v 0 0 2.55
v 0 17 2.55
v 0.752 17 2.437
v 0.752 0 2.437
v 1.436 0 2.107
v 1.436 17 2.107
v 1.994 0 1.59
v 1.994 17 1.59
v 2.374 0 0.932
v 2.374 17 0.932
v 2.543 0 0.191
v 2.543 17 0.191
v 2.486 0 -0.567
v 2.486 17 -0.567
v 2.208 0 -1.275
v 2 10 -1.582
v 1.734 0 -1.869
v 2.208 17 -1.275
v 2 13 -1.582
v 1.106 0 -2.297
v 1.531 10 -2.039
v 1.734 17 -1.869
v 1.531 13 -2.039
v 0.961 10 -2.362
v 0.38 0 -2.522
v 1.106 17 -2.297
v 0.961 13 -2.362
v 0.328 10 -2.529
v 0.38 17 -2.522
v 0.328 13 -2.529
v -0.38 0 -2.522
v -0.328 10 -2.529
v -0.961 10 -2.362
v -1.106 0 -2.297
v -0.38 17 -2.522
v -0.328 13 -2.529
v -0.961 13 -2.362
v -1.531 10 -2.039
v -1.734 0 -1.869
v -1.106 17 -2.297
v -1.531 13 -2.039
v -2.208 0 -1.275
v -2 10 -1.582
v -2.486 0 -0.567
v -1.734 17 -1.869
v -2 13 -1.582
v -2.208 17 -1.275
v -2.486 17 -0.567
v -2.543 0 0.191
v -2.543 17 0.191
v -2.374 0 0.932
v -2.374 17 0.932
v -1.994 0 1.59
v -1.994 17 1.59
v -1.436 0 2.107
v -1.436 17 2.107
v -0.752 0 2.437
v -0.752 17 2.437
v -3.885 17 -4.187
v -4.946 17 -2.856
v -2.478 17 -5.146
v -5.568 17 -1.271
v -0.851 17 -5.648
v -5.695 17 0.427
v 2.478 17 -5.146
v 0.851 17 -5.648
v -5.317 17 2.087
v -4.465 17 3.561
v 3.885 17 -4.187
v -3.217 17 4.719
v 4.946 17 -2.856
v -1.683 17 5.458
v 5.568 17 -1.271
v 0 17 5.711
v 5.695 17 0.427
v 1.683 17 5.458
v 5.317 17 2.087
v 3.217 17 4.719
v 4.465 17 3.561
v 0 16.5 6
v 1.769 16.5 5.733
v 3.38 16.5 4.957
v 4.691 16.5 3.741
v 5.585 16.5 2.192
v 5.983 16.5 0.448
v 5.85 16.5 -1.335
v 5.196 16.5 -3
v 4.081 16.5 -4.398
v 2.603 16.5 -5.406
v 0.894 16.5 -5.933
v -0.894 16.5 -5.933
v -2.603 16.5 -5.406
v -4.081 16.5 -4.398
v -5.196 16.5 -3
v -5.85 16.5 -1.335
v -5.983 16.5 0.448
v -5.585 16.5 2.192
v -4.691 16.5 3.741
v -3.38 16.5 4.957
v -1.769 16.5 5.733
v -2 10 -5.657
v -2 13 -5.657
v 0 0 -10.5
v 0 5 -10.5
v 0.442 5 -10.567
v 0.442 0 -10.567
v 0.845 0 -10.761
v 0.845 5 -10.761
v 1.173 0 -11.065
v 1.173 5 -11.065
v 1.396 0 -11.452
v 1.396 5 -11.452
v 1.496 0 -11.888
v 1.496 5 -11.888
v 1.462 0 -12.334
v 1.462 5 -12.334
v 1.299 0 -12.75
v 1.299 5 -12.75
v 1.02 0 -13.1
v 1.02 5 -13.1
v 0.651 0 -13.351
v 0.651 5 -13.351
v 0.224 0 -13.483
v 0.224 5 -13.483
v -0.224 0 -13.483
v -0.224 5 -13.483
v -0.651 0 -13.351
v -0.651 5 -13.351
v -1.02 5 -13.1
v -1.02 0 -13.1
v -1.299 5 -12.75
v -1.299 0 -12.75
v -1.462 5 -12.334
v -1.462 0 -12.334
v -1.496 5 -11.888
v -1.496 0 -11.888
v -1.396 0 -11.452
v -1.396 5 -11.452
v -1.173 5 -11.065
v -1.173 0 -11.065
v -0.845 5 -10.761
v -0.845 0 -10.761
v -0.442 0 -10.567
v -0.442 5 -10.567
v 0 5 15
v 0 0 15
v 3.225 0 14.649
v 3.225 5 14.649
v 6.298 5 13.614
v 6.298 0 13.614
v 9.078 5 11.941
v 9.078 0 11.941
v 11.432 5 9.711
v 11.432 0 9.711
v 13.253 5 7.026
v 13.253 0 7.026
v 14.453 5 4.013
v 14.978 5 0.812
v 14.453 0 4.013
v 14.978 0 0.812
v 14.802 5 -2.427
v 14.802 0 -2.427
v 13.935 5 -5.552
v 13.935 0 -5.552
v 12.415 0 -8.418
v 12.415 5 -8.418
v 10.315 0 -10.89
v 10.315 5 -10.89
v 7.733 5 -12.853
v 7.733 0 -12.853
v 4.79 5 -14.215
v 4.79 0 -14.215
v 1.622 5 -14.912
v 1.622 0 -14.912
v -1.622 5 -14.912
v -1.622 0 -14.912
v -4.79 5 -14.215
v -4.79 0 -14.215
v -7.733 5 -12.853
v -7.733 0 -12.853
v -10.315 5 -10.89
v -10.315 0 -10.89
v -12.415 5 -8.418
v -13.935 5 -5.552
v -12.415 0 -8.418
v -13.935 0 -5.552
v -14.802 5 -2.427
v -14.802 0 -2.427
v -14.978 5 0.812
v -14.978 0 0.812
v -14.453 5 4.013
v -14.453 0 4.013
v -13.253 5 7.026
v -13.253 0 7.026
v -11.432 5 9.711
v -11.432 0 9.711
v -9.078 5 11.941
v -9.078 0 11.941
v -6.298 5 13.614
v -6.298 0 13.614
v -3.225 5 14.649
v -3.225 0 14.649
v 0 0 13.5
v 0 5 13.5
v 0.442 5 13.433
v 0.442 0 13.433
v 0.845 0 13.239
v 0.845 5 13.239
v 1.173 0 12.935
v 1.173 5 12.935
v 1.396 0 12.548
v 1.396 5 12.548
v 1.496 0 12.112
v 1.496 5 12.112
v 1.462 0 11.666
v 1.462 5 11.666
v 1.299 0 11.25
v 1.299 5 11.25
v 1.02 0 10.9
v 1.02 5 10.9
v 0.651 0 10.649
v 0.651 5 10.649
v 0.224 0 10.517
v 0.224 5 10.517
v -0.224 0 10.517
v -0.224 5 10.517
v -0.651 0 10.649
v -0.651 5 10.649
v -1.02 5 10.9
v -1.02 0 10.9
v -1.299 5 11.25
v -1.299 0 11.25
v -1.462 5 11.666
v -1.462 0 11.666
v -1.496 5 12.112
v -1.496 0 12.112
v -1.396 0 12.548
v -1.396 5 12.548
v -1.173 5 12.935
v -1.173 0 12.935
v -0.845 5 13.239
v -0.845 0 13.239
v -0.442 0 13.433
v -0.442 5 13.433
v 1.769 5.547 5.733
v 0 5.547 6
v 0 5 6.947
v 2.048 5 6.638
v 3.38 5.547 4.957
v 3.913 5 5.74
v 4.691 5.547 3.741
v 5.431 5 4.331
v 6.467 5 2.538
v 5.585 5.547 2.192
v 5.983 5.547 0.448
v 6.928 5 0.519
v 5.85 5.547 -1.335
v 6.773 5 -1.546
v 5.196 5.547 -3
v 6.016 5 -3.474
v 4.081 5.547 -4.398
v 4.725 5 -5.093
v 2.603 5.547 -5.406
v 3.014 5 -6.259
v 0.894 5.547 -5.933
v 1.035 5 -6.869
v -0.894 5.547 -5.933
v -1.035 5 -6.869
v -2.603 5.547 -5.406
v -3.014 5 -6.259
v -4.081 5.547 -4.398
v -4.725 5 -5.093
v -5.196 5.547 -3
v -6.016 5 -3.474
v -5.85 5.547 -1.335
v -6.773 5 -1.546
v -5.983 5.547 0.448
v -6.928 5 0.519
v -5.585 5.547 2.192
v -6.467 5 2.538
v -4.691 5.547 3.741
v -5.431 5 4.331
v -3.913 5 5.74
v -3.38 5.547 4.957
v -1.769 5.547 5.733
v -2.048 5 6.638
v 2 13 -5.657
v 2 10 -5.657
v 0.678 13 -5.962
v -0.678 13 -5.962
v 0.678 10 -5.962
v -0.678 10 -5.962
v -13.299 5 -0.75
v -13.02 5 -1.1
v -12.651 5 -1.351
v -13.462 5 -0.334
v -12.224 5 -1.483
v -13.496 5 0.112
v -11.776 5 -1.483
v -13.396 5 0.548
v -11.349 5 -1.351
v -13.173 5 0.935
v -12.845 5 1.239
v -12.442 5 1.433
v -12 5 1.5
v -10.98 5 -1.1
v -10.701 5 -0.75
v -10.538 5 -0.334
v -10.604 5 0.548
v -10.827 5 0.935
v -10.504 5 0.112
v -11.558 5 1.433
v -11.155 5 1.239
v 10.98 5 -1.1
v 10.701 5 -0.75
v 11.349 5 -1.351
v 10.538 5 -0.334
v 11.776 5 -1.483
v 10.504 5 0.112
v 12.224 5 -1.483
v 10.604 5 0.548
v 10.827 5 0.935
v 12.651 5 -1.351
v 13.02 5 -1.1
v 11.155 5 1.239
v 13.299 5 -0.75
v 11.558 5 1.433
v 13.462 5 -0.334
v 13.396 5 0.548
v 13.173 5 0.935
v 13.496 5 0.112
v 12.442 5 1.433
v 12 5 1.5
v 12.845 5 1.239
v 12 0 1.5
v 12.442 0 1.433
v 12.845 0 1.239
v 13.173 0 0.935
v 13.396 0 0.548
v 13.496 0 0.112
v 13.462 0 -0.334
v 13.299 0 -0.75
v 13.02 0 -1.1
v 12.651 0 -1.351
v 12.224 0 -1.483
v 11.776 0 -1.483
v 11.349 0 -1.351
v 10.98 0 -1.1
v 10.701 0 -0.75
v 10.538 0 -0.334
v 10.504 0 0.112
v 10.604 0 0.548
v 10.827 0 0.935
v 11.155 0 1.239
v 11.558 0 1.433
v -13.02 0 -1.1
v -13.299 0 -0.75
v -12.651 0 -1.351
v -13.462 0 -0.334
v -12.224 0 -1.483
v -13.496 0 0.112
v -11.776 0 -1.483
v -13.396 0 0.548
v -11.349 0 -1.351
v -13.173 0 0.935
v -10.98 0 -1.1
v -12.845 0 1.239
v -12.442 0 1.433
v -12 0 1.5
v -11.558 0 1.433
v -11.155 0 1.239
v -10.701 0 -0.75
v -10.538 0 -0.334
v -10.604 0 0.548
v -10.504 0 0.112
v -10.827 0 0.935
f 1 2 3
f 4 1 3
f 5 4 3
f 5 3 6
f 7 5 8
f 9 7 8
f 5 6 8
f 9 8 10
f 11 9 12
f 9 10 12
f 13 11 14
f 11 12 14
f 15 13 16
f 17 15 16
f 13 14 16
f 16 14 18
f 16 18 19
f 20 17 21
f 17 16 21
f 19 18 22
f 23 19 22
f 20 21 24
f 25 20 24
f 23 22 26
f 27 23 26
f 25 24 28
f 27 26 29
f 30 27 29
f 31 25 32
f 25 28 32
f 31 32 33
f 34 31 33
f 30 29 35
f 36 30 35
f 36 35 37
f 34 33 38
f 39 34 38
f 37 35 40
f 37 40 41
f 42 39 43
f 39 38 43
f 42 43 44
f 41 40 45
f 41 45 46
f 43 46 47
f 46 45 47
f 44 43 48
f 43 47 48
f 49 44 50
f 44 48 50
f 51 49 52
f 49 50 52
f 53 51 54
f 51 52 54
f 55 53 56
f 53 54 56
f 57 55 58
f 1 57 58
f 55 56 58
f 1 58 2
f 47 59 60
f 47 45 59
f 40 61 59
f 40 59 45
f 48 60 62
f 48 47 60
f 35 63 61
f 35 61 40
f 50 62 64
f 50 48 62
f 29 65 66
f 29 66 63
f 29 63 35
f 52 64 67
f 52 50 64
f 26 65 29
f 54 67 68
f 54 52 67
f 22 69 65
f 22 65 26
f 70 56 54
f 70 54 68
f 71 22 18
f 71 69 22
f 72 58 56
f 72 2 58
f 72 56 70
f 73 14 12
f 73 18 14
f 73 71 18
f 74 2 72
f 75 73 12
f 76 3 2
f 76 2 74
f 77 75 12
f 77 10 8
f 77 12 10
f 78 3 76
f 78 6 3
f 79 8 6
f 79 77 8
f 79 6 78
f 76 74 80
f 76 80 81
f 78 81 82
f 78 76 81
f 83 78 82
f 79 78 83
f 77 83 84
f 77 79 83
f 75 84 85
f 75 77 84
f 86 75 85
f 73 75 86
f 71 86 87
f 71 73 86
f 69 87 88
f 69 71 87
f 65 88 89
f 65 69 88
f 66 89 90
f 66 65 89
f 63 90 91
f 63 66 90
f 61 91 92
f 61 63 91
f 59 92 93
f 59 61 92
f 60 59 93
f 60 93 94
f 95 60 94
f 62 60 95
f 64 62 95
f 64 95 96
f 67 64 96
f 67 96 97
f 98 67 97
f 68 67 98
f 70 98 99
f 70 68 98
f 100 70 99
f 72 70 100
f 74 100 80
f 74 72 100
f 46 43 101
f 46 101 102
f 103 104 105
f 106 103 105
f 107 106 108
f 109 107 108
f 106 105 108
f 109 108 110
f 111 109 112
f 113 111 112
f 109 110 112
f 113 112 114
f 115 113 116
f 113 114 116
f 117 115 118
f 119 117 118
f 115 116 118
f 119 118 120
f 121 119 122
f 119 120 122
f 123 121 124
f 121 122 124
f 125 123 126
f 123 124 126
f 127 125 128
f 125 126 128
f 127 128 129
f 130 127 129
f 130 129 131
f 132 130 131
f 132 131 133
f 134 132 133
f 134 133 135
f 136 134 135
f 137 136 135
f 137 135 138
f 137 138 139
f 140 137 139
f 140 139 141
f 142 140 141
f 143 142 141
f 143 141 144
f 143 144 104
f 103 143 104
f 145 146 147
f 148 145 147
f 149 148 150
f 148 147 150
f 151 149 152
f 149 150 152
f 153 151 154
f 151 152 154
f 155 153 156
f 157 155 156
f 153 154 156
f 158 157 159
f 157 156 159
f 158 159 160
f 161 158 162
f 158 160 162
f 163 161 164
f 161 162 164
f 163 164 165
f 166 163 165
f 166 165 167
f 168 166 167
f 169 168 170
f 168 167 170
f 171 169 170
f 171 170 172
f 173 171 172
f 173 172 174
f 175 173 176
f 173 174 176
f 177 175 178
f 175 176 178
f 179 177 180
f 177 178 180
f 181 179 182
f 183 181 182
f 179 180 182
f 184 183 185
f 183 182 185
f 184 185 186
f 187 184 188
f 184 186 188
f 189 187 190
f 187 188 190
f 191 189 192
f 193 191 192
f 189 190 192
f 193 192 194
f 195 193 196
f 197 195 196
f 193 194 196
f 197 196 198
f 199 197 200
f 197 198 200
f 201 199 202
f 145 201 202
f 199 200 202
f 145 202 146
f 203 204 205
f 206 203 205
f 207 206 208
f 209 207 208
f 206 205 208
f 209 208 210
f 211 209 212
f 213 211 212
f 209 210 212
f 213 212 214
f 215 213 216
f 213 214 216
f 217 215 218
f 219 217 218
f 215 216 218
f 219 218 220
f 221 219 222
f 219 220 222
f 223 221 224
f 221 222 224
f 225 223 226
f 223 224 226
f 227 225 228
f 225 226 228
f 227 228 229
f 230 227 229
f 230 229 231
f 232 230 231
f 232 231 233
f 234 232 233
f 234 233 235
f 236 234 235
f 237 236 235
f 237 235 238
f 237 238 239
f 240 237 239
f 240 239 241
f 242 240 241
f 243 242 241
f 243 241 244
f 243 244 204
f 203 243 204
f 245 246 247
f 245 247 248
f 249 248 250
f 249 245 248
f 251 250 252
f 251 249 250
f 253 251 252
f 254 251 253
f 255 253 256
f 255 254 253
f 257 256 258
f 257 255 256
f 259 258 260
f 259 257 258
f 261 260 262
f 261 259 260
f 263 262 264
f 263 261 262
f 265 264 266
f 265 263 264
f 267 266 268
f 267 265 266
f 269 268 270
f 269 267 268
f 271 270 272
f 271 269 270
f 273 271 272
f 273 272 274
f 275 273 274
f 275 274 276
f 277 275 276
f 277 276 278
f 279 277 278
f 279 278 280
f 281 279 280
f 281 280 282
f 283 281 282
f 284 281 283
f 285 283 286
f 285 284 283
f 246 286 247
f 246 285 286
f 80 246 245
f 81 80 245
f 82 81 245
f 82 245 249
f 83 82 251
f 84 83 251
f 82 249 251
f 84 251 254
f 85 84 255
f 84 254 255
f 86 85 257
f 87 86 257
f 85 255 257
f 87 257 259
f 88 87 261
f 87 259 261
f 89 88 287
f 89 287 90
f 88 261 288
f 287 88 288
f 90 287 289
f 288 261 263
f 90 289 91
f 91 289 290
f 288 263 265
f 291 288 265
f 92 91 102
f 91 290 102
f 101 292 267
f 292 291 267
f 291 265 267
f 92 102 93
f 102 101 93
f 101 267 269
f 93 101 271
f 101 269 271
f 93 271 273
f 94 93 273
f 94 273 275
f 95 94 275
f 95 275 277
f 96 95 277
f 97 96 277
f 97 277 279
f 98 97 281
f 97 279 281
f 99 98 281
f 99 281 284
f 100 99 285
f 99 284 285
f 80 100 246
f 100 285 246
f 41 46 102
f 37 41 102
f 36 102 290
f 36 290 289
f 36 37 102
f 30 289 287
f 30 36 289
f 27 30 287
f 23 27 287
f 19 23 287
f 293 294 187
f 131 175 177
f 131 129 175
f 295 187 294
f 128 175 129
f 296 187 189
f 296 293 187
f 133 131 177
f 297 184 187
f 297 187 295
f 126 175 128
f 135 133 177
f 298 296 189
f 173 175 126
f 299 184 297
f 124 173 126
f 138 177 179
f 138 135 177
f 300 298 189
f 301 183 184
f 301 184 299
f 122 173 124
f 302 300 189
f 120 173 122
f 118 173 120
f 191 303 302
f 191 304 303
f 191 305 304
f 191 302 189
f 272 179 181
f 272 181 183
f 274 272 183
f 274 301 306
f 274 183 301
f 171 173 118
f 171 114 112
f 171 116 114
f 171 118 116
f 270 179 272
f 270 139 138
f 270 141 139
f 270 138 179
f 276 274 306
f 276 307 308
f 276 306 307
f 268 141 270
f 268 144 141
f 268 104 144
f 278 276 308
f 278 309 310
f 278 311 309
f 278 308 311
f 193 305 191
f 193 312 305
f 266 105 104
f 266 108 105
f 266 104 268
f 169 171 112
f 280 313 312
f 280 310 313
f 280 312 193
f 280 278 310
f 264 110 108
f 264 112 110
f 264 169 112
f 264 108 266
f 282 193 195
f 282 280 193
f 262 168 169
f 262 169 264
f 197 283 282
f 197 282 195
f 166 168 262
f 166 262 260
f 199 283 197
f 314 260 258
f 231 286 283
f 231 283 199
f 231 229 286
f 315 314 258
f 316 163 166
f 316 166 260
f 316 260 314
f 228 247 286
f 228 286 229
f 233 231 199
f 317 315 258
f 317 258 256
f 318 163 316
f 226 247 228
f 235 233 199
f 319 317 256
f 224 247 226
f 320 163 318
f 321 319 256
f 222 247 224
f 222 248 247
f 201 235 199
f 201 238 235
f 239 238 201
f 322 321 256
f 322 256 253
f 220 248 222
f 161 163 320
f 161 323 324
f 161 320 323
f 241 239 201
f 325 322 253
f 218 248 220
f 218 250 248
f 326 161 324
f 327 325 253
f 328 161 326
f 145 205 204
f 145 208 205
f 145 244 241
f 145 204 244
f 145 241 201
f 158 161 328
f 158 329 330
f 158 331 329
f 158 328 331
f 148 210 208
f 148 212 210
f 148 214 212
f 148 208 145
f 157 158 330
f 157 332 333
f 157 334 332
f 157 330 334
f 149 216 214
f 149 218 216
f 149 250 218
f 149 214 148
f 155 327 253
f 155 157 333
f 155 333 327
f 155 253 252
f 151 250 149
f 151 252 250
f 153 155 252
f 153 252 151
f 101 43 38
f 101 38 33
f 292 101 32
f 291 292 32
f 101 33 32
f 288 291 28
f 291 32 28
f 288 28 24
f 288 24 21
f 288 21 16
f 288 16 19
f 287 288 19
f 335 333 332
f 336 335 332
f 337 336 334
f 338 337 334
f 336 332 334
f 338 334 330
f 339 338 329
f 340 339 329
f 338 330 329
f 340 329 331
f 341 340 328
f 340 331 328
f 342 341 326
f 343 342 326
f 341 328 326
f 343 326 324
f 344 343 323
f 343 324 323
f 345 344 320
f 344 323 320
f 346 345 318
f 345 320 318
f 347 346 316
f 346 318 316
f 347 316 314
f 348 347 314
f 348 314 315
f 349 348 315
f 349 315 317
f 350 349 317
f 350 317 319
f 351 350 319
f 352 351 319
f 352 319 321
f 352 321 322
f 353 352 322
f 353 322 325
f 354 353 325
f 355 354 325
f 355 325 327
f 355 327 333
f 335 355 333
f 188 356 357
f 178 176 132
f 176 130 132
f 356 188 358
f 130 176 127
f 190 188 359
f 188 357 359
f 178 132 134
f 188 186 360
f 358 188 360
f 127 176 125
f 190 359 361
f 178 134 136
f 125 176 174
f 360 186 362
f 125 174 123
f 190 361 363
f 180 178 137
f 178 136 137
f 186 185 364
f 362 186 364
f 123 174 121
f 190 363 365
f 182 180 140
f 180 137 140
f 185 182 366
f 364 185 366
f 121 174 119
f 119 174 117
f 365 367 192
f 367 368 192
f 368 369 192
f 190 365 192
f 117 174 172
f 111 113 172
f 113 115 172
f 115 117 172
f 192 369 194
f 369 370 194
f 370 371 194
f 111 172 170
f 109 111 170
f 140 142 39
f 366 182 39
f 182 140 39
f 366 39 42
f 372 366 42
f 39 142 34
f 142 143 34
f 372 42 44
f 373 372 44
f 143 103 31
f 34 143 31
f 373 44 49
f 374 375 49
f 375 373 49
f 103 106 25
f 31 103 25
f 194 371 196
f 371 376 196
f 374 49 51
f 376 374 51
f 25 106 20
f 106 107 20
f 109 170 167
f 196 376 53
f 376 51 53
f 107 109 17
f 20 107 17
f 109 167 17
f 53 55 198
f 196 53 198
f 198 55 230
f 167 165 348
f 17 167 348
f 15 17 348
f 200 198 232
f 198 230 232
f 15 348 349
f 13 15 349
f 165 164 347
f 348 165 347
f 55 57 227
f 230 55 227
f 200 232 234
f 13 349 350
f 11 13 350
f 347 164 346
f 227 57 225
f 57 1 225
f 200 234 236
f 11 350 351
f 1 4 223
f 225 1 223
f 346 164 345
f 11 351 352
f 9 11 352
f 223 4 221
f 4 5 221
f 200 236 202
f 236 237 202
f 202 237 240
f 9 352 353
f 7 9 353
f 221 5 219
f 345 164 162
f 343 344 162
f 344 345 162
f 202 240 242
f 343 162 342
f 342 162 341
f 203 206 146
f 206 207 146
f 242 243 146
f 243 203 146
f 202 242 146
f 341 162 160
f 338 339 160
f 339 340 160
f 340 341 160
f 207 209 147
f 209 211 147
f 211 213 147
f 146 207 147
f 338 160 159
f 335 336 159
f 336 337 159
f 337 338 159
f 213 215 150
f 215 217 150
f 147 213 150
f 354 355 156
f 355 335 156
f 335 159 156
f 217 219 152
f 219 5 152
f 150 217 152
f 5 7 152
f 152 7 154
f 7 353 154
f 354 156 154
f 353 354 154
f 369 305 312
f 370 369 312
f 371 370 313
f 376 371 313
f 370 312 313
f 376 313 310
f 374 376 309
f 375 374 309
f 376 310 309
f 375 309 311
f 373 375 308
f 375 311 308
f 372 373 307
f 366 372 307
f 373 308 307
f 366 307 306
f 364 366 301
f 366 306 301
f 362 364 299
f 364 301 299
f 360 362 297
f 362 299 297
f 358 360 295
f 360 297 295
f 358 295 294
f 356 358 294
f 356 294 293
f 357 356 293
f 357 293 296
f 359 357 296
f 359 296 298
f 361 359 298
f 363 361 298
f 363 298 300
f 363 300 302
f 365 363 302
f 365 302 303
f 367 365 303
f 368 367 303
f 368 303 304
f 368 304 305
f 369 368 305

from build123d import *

# Parameters (mm, degrees)
SKETCH_1_R          = 15
EXTRUDE_1_DEPTH     = 5
SKETCH_4_R          = 6
EXTRUDE_2_DEPTH     = 12
SKETCH_5_R          = 2.55
CUT_EXTRUDE_1_DEPTH = 28.184554438
SKETCH_6_W          = 4
SKETCH_6_H          = 3
CUT_EXTRUDE_2_DEPTH = 28.184554438
CHAMFER_1_SIZE      = 0.947
CHAMFER_1_SIZE2     = 0.546750705
CHAMFER_2_SIZE      = 0.5
CHAMFER_2_SIZE2     = 0.288675135
SKETCH_7_R          = 1.5
CUT_EXTRUDE_3_DEPTH = 25.372115214


with BuildPart() as part:
    # 草图1 → 凸台-拉伸1 (new body)
    with BuildSketch(Plane(origin=(0, 0, 0), x_dir=(1, 0, 0), z_dir=(0, 1, 0))):
        with Locations(Location((0, 0, 0), (0, 0, 270))):
            Circle(SKETCH_1_R)
    extrude(amount=EXTRUDE_1_DEPTH)

    # 草图4 → 凸台-拉伸2 (add)
    with BuildSketch(Plane(origin=(0, 5, 0), x_dir=(1, 0, 0), z_dir=(0, 1, 0))):
        with Locations(Location((0, 0, 0), (0, 0, 270))):
            Circle(SKETCH_4_R)
    extrude(amount=EXTRUDE_2_DEPTH)

    # 草图5 → 切除-拉伸1 (cut, through all)
    with BuildSketch(Plane(origin=(0, 17, 0), x_dir=(1, 0, 0), z_dir=(0, 1, 0))):
        with Locations(Location((0, 0, 0), (0, 0, 270))):
            Circle(SKETCH_5_R)
    extrude(amount=-CUT_EXTRUDE_1_DEPTH, mode=Mode.SUBTRACT)

    # 草图6 → 切除-拉伸2 (cut, through all)
    with BuildSketch(Plane.XY):
        with Locations((0, 11.5)):
            Rectangle(SKETCH_6_W, SKETCH_6_H)
    extrude(amount=-CUT_EXTRUDE_2_DEPTH, mode=Mode.SUBTRACT)

    # 倒角1
    chamfer_1_edges = [part.edges().sort_by_distance(p)[0] for p in [
        (0, 5, -6),
    ]]
    chamfer_1_side = [part.faces().sort_by_distance(p)[0] for p in [
        (0, 5, -14.575735931),
    ]]
    chamfer(chamfer_1_edges, length=CHAMFER_1_SIZE, length2=CHAMFER_1_SIZE2, reference=chamfer_1_side[0])

    # 倒角2
    chamfer_2_edges = [part.edges().sort_by_distance(p)[0] for p in [
        (0, 17, -6),
    ]]
    chamfer_2_side = [part.faces().sort_by_distance(p)[0] for p in [
        (0, 11.273375352, -6),
    ]]
    chamfer(chamfer_2_edges, length=CHAMFER_2_SIZE, length2=CHAMFER_2_SIZE2, reference=chamfer_2_side[0])

    # 草图7 → 切除-拉伸3 (cut, through all)
    with BuildSketch(Plane(origin=(0, 5, 0), x_dir=(1, 0, 0), z_dir=(0, 1, 0))):
        with Locations(Location((0, 12, 0), (0, 0, 270))):
            Circle(SKETCH_7_R)
        with Locations(Location((-12, 0, 0), (0, 0, 270))):
            Circle(SKETCH_7_R)
        with Locations(Location((12, 0, 0), (0, 0, 270))):
            Circle(SKETCH_7_R)
        with Locations(Location((0, -12, 0), (0, 0, 270))):
            Circle(SKETCH_7_R)
    extrude(amount=-CUT_EXTRUDE_3_DEPTH, mode=Mode.SUBTRACT)


solid = part.part
